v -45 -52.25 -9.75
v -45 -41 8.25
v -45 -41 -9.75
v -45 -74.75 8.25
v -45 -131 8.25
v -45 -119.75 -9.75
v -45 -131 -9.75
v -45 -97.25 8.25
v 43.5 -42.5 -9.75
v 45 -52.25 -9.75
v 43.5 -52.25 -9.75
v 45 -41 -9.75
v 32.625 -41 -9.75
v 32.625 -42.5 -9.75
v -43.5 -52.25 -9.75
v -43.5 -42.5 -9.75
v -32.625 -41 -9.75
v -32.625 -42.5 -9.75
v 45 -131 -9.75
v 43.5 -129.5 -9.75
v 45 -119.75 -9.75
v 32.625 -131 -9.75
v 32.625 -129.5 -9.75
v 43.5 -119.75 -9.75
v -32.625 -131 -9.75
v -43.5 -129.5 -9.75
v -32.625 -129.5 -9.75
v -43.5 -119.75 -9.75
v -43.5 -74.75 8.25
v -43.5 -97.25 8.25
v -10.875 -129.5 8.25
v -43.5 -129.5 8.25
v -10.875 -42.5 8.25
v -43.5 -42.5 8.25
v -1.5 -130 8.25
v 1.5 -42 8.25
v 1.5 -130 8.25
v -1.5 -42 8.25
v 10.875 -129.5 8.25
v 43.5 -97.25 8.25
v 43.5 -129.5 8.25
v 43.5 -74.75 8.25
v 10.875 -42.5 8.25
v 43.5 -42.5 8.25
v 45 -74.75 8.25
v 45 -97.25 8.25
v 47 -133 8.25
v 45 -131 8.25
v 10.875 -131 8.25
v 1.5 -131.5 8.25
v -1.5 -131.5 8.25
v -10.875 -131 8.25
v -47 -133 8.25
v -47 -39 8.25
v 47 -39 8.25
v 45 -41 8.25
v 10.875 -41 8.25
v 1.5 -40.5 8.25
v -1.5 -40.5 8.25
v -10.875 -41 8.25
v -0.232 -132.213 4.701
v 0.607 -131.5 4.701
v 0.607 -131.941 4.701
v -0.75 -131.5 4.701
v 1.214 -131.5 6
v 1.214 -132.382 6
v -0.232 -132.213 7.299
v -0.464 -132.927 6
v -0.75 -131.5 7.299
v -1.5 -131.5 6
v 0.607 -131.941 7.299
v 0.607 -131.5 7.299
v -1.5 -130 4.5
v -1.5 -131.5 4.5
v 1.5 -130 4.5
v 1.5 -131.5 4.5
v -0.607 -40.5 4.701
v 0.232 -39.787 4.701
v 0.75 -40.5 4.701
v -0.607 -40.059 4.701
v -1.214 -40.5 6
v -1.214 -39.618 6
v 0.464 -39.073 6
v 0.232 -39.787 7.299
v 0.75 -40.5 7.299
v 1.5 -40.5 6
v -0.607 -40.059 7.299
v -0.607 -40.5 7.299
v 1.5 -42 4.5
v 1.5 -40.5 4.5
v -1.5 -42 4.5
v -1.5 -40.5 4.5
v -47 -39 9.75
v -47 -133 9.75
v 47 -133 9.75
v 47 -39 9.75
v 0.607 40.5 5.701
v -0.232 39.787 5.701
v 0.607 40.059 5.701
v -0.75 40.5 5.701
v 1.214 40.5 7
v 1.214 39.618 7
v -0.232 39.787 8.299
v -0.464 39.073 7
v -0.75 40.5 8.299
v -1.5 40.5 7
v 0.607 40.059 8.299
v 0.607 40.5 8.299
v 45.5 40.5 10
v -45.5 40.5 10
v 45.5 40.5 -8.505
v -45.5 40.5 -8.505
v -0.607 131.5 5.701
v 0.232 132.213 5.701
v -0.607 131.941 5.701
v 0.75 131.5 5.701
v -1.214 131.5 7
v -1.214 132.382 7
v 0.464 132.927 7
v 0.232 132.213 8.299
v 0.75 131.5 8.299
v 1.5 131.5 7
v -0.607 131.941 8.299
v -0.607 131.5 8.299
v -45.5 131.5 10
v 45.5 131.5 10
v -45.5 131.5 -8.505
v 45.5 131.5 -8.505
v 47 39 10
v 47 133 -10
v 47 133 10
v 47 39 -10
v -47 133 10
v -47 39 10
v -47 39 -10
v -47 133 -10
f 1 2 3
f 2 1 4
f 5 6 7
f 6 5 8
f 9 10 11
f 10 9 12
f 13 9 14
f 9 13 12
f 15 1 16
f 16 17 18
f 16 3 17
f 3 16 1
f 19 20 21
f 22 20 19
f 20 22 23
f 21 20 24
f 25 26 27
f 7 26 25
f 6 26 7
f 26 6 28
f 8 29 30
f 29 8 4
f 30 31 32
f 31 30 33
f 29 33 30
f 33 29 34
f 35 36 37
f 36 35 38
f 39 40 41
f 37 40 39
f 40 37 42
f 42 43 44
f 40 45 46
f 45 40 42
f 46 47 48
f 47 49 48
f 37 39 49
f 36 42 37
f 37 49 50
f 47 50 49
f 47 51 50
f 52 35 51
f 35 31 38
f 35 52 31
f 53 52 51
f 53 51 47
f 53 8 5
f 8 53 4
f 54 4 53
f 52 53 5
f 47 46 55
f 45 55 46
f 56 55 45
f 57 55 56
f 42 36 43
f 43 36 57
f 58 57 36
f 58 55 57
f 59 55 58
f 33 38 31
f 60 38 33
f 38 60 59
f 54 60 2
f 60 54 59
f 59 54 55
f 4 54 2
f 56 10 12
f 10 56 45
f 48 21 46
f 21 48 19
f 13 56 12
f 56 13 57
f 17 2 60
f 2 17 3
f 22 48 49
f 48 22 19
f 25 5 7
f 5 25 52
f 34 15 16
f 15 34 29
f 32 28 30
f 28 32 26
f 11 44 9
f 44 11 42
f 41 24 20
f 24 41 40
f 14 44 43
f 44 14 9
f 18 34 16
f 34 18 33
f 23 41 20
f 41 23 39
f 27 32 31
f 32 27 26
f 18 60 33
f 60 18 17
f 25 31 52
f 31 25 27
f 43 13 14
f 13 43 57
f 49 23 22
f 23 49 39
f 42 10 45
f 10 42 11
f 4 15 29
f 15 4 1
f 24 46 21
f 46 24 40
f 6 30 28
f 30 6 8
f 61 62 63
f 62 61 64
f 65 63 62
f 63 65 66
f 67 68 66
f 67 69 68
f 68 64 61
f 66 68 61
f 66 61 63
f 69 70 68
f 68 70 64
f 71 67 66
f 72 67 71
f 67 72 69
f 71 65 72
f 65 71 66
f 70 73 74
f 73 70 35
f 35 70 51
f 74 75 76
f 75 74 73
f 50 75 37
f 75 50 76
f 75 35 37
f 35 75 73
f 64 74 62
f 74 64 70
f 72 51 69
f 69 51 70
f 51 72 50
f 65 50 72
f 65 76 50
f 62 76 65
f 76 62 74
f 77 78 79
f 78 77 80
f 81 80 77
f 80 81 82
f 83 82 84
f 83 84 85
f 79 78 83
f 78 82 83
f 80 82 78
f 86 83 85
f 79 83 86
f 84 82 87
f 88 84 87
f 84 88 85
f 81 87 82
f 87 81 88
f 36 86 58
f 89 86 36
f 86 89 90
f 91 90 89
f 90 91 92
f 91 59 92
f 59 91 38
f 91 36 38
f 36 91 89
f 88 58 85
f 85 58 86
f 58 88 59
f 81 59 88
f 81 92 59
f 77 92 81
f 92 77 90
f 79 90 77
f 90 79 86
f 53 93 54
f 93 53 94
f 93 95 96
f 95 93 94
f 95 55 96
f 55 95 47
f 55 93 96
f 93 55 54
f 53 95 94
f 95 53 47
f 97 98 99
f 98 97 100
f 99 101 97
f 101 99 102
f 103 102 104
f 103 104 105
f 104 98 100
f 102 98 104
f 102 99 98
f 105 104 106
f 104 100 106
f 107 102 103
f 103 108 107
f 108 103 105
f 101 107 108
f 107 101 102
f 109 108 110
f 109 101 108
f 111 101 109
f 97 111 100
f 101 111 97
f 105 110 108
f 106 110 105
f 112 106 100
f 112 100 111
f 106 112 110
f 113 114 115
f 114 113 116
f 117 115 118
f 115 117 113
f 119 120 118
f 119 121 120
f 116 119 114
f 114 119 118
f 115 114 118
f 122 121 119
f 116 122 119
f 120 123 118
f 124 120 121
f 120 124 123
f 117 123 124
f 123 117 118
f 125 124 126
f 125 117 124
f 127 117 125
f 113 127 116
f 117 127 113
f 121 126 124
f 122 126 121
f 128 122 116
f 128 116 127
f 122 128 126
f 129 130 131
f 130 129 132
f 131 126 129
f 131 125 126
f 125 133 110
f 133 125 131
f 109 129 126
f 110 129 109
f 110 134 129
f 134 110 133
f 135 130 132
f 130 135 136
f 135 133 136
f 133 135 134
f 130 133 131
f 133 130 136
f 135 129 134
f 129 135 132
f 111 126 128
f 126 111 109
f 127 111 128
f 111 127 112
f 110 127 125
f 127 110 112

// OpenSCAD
longueur_carte = 86;
largeur_carte = 86;
epaisseur_carte = 0.3;
nb_cartes = 60;
hauteur_cartes = epaisseur_carte*nb_cartes;
epaisseur = 1.5;
marge = 0.5;
manifold = 0.01;
largeur_plaque = largeur_carte+4*marge+4*epaisseur;
longueur_plaque = longueur_carte+4*marge+4*epaisseur;

module bloc_carte(longueur_carte, largeur_carte, hauteur_bloc, epaisseur){
	difference(){
		cube([longueur_carte+2*epaisseur, largeur_carte+2*epaisseur, hauteur_bloc], center=true);
		cube([longueur_carte, largeur_carte, 2*hauteur_bloc], center=true);
		triangle_decoupe(largeur_carte+3*epaisseur, longueur_carte, 2*hauteur_bloc);
		rotate([0,0,90]) triangle_decoupe(longueur_carte+3*epaisseur, largeur_carte+2*epaisseur, 2*hauteur_bloc);
	}
}

module triangle_decoupe(longueur, largeur, hauteur){
	translate([-largeur/2,0,hauteur/2])rotate([-90,0,0]) linear_extrude(height=longueur, center=true) polygon(points=[[0,0],[largeur,0],[largeur/2,hauteur]], paths=[[0,1,2]]);
}

module bloc_verrou(largeur, epaisseur){
	translate([0,-largeur/2,0]) verrou(epaisseur);
	translate([0,largeur/2,0]) rotate([0,0,180])verrou(epaisseur);
}

module verrou(epaisseur){
	translate([0,0, 2*epaisseur]) sphere(r = epaisseur);
	translate([0,epaisseur/2, 3*epaisseur/2])cube([2*epaisseur, epaisseur, 3*epaisseur], center=true);
}

module base(){
	cube([longueur_plaque, largeur_plaque, epaisseur], center=true);
	translate([0,0,(hauteur_cartes+epaisseur)/2])bloc_carte(longueur_carte+2*marge, largeur_carte+2*marge, hauteur_cartes, epaisseur);	
	bloc_verrou(largeur_plaque-2*epaisseur, epaisseur);
}

module couvercle(){
	difference(){
		cube([longueur_plaque, largeur_plaque, hauteur_cartes+epaisseur+marge], center=true);
		translate([0,0,epaisseur/2]) cube([longueur_plaque-2*epaisseur, largeur_plaque-2*epaisseur, hauteur_cartes+manifold+marge], center=true);
		translate([0,0,(hauteur_cartes+epaisseur+marge)/2]) rotate([0,180,0]) bloc_verrou(largeur_plaque-2*epaisseur, epaisseur);
	}
}

translate([0,0,hauteur_cartes/2]) rotate([0, 180, 0]) translate([0,-largeur_carte,0]) color("blue") base();
translate([0,+largeur_carte,0]) couvercle();
